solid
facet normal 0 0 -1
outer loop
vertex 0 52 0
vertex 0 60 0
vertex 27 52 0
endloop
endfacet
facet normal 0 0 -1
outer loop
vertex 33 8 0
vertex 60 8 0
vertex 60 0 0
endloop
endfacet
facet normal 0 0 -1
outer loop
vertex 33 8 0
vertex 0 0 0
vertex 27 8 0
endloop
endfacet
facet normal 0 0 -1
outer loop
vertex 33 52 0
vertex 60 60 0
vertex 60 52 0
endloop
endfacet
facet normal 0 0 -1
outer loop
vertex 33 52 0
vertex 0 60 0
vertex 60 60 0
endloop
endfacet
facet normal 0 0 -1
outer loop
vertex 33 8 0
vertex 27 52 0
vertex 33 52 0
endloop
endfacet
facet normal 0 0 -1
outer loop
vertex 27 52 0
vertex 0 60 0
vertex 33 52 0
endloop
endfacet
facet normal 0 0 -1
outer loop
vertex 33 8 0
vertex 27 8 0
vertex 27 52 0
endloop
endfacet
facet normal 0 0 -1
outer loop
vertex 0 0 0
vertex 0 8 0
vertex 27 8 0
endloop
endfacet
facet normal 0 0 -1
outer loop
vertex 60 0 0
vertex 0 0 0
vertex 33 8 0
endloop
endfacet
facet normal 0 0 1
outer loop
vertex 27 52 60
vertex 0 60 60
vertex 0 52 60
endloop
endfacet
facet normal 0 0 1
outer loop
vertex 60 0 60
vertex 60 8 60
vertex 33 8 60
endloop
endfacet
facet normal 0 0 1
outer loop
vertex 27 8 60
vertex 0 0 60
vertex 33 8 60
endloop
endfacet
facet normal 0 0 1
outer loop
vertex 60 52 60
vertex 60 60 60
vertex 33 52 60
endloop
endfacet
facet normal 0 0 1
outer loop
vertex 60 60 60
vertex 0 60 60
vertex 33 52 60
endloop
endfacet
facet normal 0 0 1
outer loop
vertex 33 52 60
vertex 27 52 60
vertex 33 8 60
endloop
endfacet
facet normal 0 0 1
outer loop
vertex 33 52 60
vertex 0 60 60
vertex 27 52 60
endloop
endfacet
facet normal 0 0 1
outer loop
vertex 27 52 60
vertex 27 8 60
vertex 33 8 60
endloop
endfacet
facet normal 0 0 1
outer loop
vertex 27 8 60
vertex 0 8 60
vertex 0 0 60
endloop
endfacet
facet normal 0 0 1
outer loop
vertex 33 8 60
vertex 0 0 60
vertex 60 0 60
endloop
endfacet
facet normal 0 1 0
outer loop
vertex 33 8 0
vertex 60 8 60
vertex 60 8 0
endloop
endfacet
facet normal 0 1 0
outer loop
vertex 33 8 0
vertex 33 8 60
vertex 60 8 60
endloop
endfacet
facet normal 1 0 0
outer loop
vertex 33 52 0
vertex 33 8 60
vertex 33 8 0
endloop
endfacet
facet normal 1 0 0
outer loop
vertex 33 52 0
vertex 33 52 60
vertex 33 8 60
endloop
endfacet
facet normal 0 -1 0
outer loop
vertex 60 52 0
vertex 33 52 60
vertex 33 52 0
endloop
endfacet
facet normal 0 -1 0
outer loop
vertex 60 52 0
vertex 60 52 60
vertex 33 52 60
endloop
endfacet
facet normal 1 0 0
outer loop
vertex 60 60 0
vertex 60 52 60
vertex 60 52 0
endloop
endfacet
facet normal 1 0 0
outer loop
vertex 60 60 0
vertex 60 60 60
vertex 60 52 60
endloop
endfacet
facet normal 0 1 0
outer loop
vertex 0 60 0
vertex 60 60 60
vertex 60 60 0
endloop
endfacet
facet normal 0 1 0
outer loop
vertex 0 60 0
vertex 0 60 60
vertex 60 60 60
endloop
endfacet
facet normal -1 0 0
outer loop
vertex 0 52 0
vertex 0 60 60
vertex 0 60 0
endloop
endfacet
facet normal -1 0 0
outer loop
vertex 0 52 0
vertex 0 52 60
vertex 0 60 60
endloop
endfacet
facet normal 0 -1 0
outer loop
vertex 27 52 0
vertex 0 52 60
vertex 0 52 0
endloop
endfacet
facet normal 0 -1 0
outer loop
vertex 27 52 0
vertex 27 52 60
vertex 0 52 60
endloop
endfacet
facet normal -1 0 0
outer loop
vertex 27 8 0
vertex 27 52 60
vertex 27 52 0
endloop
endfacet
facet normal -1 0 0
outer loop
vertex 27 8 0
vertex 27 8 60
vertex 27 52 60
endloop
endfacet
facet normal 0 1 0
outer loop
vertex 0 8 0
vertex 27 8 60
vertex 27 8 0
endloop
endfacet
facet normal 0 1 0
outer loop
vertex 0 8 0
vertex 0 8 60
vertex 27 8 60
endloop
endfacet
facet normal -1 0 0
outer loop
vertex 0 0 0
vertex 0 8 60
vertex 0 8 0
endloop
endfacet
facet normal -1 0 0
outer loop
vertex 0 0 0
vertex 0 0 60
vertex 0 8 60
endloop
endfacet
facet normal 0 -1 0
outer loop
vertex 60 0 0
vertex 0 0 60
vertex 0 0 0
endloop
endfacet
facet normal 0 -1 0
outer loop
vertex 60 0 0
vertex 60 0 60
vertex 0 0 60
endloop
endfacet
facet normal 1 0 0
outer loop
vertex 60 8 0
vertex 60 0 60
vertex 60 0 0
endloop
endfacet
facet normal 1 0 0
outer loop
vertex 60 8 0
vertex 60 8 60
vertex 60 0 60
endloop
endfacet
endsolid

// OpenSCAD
$fn = 32;

// ----------------------------------------------------------------------
// Structural section: ibeam 60 x 60 mm
// ----------------------------------------------------------------------

// --- parameters (mm) ---
sec_w = 60;               // section width, X
sec_h = 60;               // section height, Y
flange_t = 8;             // flange thickness
web_t = 6;                // web thickness
plate_t = 60;             // cut length, Z (extrusion height)

profile = [[0, 0], [60, 0], [60, 8], [33, 8], [33, 52], [60, 52], [60, 60], [0, 60], [0, 52], [27, 52], [27, 8], [0, 8]];  // primary outline, 12 points, counter clockwise

// --- the one profile operation ---
linear_extrude(height = plate_t) polygon(points = profile);
